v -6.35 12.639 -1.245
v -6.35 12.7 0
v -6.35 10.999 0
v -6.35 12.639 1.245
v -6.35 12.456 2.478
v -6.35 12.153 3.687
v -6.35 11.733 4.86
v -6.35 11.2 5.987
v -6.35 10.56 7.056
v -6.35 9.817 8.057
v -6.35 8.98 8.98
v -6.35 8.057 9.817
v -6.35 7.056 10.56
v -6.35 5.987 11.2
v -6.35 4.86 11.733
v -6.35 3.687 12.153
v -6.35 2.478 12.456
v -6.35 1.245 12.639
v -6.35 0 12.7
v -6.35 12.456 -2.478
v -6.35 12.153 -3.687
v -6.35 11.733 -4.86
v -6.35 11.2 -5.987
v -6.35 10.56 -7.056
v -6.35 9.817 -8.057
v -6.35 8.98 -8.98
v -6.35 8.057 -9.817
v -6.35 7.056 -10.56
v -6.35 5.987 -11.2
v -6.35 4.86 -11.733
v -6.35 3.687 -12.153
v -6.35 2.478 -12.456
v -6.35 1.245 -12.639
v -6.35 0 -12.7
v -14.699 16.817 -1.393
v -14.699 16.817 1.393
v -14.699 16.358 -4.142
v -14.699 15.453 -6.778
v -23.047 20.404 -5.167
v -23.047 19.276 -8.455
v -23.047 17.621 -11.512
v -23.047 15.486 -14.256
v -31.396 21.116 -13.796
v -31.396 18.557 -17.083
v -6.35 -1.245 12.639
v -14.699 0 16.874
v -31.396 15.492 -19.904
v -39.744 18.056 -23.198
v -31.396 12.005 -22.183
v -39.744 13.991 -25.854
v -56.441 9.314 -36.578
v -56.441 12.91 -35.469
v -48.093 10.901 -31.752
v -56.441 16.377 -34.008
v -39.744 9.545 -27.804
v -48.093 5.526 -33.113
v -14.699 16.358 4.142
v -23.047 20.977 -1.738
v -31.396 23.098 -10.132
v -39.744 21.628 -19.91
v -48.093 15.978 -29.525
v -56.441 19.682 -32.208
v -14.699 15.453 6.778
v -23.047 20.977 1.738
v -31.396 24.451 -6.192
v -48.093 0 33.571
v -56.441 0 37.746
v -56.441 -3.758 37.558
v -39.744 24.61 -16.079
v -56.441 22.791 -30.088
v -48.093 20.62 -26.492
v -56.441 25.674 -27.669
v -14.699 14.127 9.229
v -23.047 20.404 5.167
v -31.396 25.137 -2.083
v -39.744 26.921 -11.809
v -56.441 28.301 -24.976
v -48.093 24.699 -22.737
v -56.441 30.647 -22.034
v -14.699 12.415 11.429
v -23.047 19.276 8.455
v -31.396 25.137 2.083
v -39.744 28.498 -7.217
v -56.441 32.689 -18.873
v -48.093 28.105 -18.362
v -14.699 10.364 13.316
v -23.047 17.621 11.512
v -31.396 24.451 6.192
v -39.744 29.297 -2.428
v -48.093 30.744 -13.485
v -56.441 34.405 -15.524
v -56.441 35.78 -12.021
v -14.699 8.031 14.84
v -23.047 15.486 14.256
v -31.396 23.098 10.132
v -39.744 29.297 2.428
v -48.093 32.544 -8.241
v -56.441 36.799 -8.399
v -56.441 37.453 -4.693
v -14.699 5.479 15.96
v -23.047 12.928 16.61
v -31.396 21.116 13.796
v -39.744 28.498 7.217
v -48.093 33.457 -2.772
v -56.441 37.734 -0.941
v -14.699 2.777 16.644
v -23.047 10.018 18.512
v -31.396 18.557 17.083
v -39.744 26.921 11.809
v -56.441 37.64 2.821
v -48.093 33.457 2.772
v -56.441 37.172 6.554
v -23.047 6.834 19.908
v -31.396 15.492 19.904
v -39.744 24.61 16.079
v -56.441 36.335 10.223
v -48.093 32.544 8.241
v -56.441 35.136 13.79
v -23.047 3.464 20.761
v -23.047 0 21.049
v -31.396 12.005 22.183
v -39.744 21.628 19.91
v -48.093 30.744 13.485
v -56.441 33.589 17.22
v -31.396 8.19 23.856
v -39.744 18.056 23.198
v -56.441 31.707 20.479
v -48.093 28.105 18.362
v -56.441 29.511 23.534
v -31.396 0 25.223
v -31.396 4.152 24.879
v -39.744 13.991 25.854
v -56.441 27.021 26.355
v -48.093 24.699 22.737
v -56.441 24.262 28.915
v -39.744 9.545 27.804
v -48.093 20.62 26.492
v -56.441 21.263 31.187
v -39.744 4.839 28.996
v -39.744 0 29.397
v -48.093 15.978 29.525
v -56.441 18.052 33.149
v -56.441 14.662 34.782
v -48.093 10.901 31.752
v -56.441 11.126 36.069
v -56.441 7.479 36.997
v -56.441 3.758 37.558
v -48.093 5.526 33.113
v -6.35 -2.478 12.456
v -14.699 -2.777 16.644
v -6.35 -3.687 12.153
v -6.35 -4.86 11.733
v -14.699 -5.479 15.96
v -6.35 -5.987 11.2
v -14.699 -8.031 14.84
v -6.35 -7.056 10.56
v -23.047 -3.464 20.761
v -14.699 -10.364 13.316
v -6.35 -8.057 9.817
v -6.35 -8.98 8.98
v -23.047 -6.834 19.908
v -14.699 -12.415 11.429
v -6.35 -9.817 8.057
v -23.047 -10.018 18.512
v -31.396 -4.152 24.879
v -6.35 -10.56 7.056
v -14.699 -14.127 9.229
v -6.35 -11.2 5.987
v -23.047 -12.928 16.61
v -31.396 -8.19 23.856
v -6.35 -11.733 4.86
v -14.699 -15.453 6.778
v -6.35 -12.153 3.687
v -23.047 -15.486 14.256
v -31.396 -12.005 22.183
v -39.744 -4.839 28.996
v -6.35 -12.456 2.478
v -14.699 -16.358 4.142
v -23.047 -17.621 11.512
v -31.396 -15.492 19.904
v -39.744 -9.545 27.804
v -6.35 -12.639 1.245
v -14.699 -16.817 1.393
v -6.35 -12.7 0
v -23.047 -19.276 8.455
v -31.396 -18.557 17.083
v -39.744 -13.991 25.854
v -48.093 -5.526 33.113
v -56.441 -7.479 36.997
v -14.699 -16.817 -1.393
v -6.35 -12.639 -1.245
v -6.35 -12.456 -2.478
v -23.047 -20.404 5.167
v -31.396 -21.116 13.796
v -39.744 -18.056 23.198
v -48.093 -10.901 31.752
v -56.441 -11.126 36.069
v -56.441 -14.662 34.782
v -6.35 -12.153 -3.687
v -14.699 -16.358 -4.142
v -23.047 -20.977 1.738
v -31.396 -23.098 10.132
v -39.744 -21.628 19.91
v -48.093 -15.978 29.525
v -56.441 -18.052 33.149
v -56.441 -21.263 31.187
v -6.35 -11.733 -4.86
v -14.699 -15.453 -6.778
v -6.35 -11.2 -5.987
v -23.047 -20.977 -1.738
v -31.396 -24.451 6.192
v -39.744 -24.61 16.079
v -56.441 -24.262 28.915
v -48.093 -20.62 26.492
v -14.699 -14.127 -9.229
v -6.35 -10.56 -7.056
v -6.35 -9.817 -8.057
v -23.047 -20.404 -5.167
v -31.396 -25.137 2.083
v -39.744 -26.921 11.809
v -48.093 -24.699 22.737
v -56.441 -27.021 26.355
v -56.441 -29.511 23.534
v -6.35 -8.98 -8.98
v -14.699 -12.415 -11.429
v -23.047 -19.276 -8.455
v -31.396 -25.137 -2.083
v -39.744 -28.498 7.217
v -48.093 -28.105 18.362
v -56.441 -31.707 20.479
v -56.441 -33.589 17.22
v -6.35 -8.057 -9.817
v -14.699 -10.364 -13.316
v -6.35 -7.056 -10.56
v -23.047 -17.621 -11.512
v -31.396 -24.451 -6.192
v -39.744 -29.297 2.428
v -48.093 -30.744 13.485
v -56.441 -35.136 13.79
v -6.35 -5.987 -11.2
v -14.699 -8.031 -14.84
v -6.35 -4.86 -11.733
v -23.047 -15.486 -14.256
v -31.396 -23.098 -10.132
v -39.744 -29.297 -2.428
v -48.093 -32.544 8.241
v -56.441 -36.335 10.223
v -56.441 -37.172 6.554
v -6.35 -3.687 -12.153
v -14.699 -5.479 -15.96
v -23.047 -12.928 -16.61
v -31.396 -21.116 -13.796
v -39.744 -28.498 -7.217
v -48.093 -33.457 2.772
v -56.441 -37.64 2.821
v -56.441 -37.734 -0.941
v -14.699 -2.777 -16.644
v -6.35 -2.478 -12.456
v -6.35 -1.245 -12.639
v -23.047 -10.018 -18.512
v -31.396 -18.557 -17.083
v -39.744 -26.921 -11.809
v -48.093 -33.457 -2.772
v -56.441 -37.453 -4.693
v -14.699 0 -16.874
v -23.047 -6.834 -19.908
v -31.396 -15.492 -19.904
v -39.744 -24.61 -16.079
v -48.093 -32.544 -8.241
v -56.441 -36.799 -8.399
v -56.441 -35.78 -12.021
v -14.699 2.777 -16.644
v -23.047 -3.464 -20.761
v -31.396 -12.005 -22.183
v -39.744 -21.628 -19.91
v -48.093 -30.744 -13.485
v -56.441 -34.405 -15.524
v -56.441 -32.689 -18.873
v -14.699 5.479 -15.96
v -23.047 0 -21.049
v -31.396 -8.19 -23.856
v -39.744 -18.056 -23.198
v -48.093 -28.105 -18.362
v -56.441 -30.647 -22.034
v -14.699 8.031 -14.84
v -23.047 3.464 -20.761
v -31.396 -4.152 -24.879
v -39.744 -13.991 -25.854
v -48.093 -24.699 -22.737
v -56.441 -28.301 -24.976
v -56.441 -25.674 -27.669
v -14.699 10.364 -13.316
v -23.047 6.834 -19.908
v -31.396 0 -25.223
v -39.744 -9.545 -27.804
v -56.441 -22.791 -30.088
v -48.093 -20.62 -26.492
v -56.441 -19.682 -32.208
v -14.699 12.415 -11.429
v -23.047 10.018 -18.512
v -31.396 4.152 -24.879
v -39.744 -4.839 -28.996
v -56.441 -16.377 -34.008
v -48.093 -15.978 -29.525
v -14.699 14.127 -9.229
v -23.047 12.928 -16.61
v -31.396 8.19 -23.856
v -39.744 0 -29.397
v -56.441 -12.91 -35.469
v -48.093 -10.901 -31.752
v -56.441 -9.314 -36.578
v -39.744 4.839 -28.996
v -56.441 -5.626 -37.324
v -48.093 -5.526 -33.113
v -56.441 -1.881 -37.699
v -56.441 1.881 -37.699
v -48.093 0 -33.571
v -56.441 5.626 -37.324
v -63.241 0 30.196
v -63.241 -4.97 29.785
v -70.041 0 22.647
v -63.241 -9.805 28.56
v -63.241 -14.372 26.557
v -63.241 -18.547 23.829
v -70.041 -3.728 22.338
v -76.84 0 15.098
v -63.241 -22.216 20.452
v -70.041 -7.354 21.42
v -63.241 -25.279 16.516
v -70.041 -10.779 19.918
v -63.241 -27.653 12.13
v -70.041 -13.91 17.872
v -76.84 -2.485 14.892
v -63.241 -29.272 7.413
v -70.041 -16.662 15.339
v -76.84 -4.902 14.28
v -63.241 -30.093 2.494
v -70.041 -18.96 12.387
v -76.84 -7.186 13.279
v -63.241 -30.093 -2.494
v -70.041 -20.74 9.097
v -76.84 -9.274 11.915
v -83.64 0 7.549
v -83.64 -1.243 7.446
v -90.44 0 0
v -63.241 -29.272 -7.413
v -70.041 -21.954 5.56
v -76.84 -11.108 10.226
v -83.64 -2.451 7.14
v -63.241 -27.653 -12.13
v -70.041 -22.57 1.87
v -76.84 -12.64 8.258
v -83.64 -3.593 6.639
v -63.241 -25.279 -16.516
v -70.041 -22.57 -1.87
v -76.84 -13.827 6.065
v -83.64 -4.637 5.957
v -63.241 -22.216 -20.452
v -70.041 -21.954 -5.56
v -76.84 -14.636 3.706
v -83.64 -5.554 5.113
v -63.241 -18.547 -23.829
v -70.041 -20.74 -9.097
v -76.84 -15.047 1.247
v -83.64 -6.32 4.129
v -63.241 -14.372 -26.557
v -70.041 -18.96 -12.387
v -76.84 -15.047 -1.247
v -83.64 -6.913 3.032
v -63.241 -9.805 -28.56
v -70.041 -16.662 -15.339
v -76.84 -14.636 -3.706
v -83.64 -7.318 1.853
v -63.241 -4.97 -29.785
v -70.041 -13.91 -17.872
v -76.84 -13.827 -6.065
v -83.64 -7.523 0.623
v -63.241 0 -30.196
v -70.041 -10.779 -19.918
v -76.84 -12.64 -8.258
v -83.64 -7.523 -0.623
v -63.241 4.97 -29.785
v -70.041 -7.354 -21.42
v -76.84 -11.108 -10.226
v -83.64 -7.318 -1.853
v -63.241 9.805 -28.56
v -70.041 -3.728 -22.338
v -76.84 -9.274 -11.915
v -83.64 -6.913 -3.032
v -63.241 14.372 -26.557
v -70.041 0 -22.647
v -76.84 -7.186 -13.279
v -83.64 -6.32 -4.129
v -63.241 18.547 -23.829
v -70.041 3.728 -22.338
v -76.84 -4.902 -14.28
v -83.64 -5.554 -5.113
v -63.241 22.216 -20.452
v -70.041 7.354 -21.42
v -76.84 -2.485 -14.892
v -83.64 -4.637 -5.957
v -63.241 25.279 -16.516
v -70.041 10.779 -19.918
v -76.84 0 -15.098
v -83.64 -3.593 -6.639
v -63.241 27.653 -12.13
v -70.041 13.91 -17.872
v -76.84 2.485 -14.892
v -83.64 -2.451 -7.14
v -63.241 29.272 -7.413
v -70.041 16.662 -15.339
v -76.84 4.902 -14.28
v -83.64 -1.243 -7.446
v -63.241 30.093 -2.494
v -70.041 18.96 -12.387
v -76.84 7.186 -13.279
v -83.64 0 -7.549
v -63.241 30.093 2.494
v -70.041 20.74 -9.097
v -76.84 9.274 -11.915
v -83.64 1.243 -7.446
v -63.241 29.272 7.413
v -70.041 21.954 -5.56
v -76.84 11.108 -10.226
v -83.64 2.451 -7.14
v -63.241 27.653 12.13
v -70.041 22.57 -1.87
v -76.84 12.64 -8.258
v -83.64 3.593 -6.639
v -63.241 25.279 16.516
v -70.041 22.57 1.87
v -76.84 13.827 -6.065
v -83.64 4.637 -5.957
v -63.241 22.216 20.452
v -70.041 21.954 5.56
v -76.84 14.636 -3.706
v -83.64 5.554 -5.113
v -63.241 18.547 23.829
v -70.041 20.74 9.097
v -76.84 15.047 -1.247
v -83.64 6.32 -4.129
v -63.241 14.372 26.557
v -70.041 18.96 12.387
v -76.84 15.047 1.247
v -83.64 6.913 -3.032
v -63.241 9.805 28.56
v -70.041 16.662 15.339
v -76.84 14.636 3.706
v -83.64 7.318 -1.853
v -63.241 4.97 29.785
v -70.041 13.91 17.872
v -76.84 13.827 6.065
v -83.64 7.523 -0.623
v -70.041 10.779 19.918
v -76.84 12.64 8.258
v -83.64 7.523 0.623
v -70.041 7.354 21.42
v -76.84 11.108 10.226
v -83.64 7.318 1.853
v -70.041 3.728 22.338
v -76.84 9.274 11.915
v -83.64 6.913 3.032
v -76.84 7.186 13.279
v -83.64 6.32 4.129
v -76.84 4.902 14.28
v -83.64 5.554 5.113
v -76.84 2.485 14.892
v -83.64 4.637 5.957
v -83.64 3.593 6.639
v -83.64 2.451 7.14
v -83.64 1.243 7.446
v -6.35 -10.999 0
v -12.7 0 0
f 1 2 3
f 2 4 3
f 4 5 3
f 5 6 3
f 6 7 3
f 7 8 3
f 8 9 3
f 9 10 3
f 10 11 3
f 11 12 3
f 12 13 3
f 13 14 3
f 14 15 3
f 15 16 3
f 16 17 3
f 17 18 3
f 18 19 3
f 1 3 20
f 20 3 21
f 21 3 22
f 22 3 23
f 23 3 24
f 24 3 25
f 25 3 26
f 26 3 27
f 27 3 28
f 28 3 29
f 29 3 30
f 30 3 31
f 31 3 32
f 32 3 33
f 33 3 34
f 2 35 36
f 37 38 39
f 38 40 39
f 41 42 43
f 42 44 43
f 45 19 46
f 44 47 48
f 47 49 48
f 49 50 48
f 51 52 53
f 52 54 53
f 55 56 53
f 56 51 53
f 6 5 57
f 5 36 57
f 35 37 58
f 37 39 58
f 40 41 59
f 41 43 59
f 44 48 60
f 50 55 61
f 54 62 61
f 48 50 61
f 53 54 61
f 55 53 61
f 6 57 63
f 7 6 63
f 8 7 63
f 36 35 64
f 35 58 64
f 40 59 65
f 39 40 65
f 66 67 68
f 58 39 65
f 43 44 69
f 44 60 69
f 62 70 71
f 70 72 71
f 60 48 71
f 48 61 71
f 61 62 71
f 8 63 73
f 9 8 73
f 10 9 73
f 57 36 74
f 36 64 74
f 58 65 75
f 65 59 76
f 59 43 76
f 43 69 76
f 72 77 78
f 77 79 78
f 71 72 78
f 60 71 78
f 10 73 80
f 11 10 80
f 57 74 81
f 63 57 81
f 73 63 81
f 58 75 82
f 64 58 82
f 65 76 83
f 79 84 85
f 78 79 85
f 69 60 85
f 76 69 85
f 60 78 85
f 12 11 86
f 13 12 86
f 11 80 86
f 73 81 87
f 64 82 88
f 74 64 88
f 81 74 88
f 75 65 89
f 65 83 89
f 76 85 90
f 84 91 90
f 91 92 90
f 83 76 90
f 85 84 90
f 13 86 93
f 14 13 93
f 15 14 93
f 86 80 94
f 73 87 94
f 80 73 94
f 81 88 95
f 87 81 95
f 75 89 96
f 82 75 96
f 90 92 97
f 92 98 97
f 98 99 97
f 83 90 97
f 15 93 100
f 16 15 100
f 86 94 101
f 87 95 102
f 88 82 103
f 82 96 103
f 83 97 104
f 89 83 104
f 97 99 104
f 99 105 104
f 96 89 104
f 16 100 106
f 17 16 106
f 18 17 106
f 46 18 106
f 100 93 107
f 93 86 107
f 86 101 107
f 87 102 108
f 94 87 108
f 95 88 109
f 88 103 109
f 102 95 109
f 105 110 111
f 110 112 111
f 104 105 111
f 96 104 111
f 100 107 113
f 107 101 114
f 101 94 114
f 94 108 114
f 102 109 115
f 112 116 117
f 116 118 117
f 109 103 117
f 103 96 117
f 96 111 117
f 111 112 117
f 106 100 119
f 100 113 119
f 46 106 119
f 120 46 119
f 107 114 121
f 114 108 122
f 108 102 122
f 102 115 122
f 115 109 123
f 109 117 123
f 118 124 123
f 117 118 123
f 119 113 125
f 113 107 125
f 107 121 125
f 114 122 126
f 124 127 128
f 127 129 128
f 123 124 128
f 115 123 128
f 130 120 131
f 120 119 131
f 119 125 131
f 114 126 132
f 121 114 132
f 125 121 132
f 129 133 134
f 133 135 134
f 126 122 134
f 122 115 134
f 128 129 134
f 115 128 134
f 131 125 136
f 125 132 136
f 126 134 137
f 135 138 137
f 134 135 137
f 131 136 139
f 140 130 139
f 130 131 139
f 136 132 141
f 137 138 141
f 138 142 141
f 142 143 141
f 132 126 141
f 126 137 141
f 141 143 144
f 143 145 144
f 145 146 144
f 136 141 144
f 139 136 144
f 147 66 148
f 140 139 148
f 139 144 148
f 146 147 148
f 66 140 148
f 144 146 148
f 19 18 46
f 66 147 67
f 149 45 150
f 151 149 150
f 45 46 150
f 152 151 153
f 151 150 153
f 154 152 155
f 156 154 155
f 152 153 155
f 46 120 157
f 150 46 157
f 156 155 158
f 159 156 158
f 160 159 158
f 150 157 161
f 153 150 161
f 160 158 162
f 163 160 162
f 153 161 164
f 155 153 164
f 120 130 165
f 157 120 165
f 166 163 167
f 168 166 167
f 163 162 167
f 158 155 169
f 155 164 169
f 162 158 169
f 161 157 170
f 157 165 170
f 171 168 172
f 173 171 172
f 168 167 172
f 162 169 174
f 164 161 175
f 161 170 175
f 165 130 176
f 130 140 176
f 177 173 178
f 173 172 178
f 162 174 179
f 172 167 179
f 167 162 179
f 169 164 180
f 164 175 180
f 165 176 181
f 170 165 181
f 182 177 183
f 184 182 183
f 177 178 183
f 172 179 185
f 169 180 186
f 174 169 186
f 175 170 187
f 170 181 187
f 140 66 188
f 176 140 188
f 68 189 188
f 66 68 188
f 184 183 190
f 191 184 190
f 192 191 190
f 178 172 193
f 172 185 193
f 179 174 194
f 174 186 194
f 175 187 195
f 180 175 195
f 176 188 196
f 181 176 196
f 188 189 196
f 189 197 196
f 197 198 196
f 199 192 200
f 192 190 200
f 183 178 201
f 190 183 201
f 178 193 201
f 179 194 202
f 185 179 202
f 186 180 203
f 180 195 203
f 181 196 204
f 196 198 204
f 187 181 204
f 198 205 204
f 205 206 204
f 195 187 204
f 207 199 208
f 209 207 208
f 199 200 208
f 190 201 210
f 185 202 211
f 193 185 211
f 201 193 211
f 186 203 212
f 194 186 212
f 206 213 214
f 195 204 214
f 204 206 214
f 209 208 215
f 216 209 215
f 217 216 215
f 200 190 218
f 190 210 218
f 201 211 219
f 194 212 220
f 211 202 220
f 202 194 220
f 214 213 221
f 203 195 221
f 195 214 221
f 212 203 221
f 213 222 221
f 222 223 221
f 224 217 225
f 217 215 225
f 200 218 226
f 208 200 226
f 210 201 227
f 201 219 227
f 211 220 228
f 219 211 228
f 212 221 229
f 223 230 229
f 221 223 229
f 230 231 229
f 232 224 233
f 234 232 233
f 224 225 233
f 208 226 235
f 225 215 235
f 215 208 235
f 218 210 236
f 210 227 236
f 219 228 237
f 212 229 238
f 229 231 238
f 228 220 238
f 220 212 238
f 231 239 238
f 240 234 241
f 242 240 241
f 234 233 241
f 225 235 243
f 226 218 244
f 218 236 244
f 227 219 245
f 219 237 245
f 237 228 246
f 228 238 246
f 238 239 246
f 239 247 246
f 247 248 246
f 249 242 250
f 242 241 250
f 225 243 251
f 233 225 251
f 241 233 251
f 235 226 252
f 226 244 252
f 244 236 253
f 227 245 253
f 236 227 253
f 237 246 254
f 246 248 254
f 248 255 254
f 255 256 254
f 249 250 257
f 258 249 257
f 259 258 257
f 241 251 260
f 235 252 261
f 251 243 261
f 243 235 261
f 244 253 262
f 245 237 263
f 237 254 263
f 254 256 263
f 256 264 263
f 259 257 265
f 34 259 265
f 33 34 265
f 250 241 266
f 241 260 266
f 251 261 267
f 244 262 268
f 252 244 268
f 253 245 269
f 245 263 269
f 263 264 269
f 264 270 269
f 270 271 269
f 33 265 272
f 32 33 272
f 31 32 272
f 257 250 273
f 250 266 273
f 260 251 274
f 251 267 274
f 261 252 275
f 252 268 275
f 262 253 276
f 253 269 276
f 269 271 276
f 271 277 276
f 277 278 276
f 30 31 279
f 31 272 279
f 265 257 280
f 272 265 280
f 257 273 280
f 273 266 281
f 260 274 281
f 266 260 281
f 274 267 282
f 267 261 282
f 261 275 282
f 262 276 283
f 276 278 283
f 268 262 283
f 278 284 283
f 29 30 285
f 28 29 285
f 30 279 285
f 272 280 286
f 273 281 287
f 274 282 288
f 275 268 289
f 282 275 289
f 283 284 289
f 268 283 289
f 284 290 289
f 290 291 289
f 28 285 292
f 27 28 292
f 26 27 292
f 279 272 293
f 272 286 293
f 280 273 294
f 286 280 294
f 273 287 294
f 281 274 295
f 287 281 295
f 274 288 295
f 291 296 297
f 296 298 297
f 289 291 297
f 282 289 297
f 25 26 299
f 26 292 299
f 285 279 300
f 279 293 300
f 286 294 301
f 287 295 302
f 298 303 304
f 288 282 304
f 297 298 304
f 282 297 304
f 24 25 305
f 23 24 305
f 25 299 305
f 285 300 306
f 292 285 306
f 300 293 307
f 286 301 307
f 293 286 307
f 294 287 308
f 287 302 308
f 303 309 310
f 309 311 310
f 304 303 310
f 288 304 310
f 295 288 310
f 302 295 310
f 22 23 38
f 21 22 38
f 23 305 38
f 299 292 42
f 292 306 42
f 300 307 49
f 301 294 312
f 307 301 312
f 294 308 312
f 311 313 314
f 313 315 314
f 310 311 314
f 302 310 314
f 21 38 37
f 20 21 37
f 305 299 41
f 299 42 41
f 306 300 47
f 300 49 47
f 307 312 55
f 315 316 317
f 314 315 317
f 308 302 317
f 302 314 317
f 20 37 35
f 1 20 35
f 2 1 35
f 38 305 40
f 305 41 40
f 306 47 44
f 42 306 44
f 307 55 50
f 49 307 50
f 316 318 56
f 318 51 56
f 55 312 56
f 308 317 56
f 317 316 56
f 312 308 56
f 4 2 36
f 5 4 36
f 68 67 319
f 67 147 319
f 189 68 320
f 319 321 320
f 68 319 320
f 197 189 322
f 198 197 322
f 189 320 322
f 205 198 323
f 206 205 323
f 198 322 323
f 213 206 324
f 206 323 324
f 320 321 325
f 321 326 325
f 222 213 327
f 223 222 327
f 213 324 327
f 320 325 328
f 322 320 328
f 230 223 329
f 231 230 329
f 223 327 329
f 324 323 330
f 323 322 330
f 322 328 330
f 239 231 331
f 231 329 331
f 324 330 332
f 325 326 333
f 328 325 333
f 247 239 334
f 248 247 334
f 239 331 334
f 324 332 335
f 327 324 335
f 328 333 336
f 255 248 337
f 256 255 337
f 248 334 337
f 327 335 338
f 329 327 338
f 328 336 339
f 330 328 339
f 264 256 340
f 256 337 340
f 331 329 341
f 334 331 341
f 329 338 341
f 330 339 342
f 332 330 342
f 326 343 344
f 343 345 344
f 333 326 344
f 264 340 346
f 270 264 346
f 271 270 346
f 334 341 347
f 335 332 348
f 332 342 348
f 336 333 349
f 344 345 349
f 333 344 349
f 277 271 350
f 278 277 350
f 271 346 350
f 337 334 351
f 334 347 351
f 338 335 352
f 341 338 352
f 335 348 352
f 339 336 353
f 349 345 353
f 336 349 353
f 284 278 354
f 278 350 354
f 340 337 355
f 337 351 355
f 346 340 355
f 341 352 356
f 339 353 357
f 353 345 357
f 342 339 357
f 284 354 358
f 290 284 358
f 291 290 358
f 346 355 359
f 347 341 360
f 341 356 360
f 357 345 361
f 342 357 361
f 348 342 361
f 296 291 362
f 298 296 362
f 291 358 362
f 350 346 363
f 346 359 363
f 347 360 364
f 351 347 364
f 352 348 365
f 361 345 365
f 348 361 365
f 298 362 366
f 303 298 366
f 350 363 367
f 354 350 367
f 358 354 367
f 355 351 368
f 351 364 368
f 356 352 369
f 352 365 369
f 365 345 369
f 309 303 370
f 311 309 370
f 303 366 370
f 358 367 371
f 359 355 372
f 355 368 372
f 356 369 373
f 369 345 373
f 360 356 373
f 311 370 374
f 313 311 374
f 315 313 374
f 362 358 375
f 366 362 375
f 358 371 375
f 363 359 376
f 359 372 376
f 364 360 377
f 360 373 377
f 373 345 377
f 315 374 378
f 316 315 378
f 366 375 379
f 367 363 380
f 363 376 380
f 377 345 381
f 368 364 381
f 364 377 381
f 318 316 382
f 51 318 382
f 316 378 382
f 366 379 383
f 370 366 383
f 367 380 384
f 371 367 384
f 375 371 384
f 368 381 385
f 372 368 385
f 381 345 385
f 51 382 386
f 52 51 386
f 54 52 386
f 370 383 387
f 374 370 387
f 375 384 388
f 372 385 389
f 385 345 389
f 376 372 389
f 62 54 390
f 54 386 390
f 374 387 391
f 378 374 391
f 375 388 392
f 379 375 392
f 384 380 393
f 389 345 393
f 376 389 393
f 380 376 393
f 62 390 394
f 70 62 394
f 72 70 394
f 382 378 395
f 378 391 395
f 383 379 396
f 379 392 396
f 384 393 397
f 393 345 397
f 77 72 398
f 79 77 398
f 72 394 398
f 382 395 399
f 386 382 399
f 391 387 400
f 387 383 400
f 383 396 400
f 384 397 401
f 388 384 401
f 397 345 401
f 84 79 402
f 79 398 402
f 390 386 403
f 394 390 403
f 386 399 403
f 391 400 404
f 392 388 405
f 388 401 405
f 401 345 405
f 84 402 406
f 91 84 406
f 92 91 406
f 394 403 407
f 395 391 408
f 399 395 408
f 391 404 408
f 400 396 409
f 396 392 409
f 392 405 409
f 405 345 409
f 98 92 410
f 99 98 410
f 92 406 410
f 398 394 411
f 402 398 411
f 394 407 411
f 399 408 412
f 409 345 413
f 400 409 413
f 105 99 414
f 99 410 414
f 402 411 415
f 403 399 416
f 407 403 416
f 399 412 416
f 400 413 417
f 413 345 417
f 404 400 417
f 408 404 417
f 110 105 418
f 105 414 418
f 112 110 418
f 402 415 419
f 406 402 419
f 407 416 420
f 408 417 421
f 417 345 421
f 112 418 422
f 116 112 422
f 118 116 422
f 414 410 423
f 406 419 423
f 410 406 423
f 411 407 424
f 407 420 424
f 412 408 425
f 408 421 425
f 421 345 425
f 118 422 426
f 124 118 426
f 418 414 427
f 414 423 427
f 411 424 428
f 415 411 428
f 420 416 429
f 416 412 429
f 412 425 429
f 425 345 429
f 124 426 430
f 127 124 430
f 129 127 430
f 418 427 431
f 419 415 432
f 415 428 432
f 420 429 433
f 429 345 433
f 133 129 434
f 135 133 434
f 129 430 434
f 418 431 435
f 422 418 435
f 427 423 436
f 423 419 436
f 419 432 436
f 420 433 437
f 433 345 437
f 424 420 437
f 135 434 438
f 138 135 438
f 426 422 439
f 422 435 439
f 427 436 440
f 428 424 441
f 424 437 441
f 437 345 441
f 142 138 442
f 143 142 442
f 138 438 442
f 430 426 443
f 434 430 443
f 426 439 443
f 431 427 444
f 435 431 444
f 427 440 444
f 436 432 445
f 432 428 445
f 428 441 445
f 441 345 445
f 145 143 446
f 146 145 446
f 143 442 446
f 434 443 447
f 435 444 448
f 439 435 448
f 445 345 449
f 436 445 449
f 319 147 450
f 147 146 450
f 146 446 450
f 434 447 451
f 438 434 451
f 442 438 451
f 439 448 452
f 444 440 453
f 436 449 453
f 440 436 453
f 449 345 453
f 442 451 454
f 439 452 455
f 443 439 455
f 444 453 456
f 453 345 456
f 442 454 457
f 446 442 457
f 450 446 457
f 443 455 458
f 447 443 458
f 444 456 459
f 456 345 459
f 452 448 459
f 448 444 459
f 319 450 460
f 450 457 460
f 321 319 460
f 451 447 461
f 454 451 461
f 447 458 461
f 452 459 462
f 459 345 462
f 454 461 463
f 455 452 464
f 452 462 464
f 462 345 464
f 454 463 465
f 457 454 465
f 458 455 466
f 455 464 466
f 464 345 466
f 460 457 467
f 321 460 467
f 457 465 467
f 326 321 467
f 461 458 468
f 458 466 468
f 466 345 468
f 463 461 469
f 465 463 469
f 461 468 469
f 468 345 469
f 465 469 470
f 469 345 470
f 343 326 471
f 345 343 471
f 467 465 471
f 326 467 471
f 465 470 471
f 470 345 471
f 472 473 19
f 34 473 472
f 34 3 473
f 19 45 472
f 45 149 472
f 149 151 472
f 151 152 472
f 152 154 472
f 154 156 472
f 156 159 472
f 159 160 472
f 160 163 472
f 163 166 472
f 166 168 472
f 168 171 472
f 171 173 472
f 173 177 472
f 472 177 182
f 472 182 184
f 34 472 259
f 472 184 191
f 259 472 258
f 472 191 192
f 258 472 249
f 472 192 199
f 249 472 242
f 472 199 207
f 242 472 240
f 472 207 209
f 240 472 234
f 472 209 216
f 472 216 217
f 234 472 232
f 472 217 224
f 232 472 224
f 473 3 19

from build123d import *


with BuildPart() as f1:
    # F0 (on Front) → F1 (revolve)
    with BuildSketch(Plane.XZ):
        Polygon((-6.35, 0), (-6.35, 12.7), (-12.7, 0), align=None)
        Polygon((-12.7, 0), (-6.35, 12.7), (-56.4411745648, 37.7455872824), (-90.4398604321, 0), align=None)
    revolve(axis=Axis((-6.35, 0, 0), (1, 0, 0)))

    # F2 (on Top) → F7 section 0
    with BuildSketch(Plane.XY, mode=Mode.PRIVATE) as f7_s0:
        Polygon((-6.35, -10.9985226281), (6.35, -10.9985226281), (12.7, 0), (6.35, 10.9985226281), (-6.35, 10.9985226281), (-12.7, 0), align=None)
    loft([Vertex(0, 0, -25.4), f7_s0.sketch], mode=Mode.SUBTRACT)

    # F2 (on Top) → F8 section 0
    with BuildSketch(Plane.XY, mode=Mode.PRIVATE) as f8_s0:
        Polygon((-6.35, -10.9985226281), (6.35, -10.9985226281), (12.7, 0), (6.35, 10.9985226281), (-6.35, 10.9985226281), (-12.7, 0), align=None)
    loft([Vertex(0, 0, 25.4), f8_s0.sketch], mode=Mode.SUBTRACT)


solid = f1.part
